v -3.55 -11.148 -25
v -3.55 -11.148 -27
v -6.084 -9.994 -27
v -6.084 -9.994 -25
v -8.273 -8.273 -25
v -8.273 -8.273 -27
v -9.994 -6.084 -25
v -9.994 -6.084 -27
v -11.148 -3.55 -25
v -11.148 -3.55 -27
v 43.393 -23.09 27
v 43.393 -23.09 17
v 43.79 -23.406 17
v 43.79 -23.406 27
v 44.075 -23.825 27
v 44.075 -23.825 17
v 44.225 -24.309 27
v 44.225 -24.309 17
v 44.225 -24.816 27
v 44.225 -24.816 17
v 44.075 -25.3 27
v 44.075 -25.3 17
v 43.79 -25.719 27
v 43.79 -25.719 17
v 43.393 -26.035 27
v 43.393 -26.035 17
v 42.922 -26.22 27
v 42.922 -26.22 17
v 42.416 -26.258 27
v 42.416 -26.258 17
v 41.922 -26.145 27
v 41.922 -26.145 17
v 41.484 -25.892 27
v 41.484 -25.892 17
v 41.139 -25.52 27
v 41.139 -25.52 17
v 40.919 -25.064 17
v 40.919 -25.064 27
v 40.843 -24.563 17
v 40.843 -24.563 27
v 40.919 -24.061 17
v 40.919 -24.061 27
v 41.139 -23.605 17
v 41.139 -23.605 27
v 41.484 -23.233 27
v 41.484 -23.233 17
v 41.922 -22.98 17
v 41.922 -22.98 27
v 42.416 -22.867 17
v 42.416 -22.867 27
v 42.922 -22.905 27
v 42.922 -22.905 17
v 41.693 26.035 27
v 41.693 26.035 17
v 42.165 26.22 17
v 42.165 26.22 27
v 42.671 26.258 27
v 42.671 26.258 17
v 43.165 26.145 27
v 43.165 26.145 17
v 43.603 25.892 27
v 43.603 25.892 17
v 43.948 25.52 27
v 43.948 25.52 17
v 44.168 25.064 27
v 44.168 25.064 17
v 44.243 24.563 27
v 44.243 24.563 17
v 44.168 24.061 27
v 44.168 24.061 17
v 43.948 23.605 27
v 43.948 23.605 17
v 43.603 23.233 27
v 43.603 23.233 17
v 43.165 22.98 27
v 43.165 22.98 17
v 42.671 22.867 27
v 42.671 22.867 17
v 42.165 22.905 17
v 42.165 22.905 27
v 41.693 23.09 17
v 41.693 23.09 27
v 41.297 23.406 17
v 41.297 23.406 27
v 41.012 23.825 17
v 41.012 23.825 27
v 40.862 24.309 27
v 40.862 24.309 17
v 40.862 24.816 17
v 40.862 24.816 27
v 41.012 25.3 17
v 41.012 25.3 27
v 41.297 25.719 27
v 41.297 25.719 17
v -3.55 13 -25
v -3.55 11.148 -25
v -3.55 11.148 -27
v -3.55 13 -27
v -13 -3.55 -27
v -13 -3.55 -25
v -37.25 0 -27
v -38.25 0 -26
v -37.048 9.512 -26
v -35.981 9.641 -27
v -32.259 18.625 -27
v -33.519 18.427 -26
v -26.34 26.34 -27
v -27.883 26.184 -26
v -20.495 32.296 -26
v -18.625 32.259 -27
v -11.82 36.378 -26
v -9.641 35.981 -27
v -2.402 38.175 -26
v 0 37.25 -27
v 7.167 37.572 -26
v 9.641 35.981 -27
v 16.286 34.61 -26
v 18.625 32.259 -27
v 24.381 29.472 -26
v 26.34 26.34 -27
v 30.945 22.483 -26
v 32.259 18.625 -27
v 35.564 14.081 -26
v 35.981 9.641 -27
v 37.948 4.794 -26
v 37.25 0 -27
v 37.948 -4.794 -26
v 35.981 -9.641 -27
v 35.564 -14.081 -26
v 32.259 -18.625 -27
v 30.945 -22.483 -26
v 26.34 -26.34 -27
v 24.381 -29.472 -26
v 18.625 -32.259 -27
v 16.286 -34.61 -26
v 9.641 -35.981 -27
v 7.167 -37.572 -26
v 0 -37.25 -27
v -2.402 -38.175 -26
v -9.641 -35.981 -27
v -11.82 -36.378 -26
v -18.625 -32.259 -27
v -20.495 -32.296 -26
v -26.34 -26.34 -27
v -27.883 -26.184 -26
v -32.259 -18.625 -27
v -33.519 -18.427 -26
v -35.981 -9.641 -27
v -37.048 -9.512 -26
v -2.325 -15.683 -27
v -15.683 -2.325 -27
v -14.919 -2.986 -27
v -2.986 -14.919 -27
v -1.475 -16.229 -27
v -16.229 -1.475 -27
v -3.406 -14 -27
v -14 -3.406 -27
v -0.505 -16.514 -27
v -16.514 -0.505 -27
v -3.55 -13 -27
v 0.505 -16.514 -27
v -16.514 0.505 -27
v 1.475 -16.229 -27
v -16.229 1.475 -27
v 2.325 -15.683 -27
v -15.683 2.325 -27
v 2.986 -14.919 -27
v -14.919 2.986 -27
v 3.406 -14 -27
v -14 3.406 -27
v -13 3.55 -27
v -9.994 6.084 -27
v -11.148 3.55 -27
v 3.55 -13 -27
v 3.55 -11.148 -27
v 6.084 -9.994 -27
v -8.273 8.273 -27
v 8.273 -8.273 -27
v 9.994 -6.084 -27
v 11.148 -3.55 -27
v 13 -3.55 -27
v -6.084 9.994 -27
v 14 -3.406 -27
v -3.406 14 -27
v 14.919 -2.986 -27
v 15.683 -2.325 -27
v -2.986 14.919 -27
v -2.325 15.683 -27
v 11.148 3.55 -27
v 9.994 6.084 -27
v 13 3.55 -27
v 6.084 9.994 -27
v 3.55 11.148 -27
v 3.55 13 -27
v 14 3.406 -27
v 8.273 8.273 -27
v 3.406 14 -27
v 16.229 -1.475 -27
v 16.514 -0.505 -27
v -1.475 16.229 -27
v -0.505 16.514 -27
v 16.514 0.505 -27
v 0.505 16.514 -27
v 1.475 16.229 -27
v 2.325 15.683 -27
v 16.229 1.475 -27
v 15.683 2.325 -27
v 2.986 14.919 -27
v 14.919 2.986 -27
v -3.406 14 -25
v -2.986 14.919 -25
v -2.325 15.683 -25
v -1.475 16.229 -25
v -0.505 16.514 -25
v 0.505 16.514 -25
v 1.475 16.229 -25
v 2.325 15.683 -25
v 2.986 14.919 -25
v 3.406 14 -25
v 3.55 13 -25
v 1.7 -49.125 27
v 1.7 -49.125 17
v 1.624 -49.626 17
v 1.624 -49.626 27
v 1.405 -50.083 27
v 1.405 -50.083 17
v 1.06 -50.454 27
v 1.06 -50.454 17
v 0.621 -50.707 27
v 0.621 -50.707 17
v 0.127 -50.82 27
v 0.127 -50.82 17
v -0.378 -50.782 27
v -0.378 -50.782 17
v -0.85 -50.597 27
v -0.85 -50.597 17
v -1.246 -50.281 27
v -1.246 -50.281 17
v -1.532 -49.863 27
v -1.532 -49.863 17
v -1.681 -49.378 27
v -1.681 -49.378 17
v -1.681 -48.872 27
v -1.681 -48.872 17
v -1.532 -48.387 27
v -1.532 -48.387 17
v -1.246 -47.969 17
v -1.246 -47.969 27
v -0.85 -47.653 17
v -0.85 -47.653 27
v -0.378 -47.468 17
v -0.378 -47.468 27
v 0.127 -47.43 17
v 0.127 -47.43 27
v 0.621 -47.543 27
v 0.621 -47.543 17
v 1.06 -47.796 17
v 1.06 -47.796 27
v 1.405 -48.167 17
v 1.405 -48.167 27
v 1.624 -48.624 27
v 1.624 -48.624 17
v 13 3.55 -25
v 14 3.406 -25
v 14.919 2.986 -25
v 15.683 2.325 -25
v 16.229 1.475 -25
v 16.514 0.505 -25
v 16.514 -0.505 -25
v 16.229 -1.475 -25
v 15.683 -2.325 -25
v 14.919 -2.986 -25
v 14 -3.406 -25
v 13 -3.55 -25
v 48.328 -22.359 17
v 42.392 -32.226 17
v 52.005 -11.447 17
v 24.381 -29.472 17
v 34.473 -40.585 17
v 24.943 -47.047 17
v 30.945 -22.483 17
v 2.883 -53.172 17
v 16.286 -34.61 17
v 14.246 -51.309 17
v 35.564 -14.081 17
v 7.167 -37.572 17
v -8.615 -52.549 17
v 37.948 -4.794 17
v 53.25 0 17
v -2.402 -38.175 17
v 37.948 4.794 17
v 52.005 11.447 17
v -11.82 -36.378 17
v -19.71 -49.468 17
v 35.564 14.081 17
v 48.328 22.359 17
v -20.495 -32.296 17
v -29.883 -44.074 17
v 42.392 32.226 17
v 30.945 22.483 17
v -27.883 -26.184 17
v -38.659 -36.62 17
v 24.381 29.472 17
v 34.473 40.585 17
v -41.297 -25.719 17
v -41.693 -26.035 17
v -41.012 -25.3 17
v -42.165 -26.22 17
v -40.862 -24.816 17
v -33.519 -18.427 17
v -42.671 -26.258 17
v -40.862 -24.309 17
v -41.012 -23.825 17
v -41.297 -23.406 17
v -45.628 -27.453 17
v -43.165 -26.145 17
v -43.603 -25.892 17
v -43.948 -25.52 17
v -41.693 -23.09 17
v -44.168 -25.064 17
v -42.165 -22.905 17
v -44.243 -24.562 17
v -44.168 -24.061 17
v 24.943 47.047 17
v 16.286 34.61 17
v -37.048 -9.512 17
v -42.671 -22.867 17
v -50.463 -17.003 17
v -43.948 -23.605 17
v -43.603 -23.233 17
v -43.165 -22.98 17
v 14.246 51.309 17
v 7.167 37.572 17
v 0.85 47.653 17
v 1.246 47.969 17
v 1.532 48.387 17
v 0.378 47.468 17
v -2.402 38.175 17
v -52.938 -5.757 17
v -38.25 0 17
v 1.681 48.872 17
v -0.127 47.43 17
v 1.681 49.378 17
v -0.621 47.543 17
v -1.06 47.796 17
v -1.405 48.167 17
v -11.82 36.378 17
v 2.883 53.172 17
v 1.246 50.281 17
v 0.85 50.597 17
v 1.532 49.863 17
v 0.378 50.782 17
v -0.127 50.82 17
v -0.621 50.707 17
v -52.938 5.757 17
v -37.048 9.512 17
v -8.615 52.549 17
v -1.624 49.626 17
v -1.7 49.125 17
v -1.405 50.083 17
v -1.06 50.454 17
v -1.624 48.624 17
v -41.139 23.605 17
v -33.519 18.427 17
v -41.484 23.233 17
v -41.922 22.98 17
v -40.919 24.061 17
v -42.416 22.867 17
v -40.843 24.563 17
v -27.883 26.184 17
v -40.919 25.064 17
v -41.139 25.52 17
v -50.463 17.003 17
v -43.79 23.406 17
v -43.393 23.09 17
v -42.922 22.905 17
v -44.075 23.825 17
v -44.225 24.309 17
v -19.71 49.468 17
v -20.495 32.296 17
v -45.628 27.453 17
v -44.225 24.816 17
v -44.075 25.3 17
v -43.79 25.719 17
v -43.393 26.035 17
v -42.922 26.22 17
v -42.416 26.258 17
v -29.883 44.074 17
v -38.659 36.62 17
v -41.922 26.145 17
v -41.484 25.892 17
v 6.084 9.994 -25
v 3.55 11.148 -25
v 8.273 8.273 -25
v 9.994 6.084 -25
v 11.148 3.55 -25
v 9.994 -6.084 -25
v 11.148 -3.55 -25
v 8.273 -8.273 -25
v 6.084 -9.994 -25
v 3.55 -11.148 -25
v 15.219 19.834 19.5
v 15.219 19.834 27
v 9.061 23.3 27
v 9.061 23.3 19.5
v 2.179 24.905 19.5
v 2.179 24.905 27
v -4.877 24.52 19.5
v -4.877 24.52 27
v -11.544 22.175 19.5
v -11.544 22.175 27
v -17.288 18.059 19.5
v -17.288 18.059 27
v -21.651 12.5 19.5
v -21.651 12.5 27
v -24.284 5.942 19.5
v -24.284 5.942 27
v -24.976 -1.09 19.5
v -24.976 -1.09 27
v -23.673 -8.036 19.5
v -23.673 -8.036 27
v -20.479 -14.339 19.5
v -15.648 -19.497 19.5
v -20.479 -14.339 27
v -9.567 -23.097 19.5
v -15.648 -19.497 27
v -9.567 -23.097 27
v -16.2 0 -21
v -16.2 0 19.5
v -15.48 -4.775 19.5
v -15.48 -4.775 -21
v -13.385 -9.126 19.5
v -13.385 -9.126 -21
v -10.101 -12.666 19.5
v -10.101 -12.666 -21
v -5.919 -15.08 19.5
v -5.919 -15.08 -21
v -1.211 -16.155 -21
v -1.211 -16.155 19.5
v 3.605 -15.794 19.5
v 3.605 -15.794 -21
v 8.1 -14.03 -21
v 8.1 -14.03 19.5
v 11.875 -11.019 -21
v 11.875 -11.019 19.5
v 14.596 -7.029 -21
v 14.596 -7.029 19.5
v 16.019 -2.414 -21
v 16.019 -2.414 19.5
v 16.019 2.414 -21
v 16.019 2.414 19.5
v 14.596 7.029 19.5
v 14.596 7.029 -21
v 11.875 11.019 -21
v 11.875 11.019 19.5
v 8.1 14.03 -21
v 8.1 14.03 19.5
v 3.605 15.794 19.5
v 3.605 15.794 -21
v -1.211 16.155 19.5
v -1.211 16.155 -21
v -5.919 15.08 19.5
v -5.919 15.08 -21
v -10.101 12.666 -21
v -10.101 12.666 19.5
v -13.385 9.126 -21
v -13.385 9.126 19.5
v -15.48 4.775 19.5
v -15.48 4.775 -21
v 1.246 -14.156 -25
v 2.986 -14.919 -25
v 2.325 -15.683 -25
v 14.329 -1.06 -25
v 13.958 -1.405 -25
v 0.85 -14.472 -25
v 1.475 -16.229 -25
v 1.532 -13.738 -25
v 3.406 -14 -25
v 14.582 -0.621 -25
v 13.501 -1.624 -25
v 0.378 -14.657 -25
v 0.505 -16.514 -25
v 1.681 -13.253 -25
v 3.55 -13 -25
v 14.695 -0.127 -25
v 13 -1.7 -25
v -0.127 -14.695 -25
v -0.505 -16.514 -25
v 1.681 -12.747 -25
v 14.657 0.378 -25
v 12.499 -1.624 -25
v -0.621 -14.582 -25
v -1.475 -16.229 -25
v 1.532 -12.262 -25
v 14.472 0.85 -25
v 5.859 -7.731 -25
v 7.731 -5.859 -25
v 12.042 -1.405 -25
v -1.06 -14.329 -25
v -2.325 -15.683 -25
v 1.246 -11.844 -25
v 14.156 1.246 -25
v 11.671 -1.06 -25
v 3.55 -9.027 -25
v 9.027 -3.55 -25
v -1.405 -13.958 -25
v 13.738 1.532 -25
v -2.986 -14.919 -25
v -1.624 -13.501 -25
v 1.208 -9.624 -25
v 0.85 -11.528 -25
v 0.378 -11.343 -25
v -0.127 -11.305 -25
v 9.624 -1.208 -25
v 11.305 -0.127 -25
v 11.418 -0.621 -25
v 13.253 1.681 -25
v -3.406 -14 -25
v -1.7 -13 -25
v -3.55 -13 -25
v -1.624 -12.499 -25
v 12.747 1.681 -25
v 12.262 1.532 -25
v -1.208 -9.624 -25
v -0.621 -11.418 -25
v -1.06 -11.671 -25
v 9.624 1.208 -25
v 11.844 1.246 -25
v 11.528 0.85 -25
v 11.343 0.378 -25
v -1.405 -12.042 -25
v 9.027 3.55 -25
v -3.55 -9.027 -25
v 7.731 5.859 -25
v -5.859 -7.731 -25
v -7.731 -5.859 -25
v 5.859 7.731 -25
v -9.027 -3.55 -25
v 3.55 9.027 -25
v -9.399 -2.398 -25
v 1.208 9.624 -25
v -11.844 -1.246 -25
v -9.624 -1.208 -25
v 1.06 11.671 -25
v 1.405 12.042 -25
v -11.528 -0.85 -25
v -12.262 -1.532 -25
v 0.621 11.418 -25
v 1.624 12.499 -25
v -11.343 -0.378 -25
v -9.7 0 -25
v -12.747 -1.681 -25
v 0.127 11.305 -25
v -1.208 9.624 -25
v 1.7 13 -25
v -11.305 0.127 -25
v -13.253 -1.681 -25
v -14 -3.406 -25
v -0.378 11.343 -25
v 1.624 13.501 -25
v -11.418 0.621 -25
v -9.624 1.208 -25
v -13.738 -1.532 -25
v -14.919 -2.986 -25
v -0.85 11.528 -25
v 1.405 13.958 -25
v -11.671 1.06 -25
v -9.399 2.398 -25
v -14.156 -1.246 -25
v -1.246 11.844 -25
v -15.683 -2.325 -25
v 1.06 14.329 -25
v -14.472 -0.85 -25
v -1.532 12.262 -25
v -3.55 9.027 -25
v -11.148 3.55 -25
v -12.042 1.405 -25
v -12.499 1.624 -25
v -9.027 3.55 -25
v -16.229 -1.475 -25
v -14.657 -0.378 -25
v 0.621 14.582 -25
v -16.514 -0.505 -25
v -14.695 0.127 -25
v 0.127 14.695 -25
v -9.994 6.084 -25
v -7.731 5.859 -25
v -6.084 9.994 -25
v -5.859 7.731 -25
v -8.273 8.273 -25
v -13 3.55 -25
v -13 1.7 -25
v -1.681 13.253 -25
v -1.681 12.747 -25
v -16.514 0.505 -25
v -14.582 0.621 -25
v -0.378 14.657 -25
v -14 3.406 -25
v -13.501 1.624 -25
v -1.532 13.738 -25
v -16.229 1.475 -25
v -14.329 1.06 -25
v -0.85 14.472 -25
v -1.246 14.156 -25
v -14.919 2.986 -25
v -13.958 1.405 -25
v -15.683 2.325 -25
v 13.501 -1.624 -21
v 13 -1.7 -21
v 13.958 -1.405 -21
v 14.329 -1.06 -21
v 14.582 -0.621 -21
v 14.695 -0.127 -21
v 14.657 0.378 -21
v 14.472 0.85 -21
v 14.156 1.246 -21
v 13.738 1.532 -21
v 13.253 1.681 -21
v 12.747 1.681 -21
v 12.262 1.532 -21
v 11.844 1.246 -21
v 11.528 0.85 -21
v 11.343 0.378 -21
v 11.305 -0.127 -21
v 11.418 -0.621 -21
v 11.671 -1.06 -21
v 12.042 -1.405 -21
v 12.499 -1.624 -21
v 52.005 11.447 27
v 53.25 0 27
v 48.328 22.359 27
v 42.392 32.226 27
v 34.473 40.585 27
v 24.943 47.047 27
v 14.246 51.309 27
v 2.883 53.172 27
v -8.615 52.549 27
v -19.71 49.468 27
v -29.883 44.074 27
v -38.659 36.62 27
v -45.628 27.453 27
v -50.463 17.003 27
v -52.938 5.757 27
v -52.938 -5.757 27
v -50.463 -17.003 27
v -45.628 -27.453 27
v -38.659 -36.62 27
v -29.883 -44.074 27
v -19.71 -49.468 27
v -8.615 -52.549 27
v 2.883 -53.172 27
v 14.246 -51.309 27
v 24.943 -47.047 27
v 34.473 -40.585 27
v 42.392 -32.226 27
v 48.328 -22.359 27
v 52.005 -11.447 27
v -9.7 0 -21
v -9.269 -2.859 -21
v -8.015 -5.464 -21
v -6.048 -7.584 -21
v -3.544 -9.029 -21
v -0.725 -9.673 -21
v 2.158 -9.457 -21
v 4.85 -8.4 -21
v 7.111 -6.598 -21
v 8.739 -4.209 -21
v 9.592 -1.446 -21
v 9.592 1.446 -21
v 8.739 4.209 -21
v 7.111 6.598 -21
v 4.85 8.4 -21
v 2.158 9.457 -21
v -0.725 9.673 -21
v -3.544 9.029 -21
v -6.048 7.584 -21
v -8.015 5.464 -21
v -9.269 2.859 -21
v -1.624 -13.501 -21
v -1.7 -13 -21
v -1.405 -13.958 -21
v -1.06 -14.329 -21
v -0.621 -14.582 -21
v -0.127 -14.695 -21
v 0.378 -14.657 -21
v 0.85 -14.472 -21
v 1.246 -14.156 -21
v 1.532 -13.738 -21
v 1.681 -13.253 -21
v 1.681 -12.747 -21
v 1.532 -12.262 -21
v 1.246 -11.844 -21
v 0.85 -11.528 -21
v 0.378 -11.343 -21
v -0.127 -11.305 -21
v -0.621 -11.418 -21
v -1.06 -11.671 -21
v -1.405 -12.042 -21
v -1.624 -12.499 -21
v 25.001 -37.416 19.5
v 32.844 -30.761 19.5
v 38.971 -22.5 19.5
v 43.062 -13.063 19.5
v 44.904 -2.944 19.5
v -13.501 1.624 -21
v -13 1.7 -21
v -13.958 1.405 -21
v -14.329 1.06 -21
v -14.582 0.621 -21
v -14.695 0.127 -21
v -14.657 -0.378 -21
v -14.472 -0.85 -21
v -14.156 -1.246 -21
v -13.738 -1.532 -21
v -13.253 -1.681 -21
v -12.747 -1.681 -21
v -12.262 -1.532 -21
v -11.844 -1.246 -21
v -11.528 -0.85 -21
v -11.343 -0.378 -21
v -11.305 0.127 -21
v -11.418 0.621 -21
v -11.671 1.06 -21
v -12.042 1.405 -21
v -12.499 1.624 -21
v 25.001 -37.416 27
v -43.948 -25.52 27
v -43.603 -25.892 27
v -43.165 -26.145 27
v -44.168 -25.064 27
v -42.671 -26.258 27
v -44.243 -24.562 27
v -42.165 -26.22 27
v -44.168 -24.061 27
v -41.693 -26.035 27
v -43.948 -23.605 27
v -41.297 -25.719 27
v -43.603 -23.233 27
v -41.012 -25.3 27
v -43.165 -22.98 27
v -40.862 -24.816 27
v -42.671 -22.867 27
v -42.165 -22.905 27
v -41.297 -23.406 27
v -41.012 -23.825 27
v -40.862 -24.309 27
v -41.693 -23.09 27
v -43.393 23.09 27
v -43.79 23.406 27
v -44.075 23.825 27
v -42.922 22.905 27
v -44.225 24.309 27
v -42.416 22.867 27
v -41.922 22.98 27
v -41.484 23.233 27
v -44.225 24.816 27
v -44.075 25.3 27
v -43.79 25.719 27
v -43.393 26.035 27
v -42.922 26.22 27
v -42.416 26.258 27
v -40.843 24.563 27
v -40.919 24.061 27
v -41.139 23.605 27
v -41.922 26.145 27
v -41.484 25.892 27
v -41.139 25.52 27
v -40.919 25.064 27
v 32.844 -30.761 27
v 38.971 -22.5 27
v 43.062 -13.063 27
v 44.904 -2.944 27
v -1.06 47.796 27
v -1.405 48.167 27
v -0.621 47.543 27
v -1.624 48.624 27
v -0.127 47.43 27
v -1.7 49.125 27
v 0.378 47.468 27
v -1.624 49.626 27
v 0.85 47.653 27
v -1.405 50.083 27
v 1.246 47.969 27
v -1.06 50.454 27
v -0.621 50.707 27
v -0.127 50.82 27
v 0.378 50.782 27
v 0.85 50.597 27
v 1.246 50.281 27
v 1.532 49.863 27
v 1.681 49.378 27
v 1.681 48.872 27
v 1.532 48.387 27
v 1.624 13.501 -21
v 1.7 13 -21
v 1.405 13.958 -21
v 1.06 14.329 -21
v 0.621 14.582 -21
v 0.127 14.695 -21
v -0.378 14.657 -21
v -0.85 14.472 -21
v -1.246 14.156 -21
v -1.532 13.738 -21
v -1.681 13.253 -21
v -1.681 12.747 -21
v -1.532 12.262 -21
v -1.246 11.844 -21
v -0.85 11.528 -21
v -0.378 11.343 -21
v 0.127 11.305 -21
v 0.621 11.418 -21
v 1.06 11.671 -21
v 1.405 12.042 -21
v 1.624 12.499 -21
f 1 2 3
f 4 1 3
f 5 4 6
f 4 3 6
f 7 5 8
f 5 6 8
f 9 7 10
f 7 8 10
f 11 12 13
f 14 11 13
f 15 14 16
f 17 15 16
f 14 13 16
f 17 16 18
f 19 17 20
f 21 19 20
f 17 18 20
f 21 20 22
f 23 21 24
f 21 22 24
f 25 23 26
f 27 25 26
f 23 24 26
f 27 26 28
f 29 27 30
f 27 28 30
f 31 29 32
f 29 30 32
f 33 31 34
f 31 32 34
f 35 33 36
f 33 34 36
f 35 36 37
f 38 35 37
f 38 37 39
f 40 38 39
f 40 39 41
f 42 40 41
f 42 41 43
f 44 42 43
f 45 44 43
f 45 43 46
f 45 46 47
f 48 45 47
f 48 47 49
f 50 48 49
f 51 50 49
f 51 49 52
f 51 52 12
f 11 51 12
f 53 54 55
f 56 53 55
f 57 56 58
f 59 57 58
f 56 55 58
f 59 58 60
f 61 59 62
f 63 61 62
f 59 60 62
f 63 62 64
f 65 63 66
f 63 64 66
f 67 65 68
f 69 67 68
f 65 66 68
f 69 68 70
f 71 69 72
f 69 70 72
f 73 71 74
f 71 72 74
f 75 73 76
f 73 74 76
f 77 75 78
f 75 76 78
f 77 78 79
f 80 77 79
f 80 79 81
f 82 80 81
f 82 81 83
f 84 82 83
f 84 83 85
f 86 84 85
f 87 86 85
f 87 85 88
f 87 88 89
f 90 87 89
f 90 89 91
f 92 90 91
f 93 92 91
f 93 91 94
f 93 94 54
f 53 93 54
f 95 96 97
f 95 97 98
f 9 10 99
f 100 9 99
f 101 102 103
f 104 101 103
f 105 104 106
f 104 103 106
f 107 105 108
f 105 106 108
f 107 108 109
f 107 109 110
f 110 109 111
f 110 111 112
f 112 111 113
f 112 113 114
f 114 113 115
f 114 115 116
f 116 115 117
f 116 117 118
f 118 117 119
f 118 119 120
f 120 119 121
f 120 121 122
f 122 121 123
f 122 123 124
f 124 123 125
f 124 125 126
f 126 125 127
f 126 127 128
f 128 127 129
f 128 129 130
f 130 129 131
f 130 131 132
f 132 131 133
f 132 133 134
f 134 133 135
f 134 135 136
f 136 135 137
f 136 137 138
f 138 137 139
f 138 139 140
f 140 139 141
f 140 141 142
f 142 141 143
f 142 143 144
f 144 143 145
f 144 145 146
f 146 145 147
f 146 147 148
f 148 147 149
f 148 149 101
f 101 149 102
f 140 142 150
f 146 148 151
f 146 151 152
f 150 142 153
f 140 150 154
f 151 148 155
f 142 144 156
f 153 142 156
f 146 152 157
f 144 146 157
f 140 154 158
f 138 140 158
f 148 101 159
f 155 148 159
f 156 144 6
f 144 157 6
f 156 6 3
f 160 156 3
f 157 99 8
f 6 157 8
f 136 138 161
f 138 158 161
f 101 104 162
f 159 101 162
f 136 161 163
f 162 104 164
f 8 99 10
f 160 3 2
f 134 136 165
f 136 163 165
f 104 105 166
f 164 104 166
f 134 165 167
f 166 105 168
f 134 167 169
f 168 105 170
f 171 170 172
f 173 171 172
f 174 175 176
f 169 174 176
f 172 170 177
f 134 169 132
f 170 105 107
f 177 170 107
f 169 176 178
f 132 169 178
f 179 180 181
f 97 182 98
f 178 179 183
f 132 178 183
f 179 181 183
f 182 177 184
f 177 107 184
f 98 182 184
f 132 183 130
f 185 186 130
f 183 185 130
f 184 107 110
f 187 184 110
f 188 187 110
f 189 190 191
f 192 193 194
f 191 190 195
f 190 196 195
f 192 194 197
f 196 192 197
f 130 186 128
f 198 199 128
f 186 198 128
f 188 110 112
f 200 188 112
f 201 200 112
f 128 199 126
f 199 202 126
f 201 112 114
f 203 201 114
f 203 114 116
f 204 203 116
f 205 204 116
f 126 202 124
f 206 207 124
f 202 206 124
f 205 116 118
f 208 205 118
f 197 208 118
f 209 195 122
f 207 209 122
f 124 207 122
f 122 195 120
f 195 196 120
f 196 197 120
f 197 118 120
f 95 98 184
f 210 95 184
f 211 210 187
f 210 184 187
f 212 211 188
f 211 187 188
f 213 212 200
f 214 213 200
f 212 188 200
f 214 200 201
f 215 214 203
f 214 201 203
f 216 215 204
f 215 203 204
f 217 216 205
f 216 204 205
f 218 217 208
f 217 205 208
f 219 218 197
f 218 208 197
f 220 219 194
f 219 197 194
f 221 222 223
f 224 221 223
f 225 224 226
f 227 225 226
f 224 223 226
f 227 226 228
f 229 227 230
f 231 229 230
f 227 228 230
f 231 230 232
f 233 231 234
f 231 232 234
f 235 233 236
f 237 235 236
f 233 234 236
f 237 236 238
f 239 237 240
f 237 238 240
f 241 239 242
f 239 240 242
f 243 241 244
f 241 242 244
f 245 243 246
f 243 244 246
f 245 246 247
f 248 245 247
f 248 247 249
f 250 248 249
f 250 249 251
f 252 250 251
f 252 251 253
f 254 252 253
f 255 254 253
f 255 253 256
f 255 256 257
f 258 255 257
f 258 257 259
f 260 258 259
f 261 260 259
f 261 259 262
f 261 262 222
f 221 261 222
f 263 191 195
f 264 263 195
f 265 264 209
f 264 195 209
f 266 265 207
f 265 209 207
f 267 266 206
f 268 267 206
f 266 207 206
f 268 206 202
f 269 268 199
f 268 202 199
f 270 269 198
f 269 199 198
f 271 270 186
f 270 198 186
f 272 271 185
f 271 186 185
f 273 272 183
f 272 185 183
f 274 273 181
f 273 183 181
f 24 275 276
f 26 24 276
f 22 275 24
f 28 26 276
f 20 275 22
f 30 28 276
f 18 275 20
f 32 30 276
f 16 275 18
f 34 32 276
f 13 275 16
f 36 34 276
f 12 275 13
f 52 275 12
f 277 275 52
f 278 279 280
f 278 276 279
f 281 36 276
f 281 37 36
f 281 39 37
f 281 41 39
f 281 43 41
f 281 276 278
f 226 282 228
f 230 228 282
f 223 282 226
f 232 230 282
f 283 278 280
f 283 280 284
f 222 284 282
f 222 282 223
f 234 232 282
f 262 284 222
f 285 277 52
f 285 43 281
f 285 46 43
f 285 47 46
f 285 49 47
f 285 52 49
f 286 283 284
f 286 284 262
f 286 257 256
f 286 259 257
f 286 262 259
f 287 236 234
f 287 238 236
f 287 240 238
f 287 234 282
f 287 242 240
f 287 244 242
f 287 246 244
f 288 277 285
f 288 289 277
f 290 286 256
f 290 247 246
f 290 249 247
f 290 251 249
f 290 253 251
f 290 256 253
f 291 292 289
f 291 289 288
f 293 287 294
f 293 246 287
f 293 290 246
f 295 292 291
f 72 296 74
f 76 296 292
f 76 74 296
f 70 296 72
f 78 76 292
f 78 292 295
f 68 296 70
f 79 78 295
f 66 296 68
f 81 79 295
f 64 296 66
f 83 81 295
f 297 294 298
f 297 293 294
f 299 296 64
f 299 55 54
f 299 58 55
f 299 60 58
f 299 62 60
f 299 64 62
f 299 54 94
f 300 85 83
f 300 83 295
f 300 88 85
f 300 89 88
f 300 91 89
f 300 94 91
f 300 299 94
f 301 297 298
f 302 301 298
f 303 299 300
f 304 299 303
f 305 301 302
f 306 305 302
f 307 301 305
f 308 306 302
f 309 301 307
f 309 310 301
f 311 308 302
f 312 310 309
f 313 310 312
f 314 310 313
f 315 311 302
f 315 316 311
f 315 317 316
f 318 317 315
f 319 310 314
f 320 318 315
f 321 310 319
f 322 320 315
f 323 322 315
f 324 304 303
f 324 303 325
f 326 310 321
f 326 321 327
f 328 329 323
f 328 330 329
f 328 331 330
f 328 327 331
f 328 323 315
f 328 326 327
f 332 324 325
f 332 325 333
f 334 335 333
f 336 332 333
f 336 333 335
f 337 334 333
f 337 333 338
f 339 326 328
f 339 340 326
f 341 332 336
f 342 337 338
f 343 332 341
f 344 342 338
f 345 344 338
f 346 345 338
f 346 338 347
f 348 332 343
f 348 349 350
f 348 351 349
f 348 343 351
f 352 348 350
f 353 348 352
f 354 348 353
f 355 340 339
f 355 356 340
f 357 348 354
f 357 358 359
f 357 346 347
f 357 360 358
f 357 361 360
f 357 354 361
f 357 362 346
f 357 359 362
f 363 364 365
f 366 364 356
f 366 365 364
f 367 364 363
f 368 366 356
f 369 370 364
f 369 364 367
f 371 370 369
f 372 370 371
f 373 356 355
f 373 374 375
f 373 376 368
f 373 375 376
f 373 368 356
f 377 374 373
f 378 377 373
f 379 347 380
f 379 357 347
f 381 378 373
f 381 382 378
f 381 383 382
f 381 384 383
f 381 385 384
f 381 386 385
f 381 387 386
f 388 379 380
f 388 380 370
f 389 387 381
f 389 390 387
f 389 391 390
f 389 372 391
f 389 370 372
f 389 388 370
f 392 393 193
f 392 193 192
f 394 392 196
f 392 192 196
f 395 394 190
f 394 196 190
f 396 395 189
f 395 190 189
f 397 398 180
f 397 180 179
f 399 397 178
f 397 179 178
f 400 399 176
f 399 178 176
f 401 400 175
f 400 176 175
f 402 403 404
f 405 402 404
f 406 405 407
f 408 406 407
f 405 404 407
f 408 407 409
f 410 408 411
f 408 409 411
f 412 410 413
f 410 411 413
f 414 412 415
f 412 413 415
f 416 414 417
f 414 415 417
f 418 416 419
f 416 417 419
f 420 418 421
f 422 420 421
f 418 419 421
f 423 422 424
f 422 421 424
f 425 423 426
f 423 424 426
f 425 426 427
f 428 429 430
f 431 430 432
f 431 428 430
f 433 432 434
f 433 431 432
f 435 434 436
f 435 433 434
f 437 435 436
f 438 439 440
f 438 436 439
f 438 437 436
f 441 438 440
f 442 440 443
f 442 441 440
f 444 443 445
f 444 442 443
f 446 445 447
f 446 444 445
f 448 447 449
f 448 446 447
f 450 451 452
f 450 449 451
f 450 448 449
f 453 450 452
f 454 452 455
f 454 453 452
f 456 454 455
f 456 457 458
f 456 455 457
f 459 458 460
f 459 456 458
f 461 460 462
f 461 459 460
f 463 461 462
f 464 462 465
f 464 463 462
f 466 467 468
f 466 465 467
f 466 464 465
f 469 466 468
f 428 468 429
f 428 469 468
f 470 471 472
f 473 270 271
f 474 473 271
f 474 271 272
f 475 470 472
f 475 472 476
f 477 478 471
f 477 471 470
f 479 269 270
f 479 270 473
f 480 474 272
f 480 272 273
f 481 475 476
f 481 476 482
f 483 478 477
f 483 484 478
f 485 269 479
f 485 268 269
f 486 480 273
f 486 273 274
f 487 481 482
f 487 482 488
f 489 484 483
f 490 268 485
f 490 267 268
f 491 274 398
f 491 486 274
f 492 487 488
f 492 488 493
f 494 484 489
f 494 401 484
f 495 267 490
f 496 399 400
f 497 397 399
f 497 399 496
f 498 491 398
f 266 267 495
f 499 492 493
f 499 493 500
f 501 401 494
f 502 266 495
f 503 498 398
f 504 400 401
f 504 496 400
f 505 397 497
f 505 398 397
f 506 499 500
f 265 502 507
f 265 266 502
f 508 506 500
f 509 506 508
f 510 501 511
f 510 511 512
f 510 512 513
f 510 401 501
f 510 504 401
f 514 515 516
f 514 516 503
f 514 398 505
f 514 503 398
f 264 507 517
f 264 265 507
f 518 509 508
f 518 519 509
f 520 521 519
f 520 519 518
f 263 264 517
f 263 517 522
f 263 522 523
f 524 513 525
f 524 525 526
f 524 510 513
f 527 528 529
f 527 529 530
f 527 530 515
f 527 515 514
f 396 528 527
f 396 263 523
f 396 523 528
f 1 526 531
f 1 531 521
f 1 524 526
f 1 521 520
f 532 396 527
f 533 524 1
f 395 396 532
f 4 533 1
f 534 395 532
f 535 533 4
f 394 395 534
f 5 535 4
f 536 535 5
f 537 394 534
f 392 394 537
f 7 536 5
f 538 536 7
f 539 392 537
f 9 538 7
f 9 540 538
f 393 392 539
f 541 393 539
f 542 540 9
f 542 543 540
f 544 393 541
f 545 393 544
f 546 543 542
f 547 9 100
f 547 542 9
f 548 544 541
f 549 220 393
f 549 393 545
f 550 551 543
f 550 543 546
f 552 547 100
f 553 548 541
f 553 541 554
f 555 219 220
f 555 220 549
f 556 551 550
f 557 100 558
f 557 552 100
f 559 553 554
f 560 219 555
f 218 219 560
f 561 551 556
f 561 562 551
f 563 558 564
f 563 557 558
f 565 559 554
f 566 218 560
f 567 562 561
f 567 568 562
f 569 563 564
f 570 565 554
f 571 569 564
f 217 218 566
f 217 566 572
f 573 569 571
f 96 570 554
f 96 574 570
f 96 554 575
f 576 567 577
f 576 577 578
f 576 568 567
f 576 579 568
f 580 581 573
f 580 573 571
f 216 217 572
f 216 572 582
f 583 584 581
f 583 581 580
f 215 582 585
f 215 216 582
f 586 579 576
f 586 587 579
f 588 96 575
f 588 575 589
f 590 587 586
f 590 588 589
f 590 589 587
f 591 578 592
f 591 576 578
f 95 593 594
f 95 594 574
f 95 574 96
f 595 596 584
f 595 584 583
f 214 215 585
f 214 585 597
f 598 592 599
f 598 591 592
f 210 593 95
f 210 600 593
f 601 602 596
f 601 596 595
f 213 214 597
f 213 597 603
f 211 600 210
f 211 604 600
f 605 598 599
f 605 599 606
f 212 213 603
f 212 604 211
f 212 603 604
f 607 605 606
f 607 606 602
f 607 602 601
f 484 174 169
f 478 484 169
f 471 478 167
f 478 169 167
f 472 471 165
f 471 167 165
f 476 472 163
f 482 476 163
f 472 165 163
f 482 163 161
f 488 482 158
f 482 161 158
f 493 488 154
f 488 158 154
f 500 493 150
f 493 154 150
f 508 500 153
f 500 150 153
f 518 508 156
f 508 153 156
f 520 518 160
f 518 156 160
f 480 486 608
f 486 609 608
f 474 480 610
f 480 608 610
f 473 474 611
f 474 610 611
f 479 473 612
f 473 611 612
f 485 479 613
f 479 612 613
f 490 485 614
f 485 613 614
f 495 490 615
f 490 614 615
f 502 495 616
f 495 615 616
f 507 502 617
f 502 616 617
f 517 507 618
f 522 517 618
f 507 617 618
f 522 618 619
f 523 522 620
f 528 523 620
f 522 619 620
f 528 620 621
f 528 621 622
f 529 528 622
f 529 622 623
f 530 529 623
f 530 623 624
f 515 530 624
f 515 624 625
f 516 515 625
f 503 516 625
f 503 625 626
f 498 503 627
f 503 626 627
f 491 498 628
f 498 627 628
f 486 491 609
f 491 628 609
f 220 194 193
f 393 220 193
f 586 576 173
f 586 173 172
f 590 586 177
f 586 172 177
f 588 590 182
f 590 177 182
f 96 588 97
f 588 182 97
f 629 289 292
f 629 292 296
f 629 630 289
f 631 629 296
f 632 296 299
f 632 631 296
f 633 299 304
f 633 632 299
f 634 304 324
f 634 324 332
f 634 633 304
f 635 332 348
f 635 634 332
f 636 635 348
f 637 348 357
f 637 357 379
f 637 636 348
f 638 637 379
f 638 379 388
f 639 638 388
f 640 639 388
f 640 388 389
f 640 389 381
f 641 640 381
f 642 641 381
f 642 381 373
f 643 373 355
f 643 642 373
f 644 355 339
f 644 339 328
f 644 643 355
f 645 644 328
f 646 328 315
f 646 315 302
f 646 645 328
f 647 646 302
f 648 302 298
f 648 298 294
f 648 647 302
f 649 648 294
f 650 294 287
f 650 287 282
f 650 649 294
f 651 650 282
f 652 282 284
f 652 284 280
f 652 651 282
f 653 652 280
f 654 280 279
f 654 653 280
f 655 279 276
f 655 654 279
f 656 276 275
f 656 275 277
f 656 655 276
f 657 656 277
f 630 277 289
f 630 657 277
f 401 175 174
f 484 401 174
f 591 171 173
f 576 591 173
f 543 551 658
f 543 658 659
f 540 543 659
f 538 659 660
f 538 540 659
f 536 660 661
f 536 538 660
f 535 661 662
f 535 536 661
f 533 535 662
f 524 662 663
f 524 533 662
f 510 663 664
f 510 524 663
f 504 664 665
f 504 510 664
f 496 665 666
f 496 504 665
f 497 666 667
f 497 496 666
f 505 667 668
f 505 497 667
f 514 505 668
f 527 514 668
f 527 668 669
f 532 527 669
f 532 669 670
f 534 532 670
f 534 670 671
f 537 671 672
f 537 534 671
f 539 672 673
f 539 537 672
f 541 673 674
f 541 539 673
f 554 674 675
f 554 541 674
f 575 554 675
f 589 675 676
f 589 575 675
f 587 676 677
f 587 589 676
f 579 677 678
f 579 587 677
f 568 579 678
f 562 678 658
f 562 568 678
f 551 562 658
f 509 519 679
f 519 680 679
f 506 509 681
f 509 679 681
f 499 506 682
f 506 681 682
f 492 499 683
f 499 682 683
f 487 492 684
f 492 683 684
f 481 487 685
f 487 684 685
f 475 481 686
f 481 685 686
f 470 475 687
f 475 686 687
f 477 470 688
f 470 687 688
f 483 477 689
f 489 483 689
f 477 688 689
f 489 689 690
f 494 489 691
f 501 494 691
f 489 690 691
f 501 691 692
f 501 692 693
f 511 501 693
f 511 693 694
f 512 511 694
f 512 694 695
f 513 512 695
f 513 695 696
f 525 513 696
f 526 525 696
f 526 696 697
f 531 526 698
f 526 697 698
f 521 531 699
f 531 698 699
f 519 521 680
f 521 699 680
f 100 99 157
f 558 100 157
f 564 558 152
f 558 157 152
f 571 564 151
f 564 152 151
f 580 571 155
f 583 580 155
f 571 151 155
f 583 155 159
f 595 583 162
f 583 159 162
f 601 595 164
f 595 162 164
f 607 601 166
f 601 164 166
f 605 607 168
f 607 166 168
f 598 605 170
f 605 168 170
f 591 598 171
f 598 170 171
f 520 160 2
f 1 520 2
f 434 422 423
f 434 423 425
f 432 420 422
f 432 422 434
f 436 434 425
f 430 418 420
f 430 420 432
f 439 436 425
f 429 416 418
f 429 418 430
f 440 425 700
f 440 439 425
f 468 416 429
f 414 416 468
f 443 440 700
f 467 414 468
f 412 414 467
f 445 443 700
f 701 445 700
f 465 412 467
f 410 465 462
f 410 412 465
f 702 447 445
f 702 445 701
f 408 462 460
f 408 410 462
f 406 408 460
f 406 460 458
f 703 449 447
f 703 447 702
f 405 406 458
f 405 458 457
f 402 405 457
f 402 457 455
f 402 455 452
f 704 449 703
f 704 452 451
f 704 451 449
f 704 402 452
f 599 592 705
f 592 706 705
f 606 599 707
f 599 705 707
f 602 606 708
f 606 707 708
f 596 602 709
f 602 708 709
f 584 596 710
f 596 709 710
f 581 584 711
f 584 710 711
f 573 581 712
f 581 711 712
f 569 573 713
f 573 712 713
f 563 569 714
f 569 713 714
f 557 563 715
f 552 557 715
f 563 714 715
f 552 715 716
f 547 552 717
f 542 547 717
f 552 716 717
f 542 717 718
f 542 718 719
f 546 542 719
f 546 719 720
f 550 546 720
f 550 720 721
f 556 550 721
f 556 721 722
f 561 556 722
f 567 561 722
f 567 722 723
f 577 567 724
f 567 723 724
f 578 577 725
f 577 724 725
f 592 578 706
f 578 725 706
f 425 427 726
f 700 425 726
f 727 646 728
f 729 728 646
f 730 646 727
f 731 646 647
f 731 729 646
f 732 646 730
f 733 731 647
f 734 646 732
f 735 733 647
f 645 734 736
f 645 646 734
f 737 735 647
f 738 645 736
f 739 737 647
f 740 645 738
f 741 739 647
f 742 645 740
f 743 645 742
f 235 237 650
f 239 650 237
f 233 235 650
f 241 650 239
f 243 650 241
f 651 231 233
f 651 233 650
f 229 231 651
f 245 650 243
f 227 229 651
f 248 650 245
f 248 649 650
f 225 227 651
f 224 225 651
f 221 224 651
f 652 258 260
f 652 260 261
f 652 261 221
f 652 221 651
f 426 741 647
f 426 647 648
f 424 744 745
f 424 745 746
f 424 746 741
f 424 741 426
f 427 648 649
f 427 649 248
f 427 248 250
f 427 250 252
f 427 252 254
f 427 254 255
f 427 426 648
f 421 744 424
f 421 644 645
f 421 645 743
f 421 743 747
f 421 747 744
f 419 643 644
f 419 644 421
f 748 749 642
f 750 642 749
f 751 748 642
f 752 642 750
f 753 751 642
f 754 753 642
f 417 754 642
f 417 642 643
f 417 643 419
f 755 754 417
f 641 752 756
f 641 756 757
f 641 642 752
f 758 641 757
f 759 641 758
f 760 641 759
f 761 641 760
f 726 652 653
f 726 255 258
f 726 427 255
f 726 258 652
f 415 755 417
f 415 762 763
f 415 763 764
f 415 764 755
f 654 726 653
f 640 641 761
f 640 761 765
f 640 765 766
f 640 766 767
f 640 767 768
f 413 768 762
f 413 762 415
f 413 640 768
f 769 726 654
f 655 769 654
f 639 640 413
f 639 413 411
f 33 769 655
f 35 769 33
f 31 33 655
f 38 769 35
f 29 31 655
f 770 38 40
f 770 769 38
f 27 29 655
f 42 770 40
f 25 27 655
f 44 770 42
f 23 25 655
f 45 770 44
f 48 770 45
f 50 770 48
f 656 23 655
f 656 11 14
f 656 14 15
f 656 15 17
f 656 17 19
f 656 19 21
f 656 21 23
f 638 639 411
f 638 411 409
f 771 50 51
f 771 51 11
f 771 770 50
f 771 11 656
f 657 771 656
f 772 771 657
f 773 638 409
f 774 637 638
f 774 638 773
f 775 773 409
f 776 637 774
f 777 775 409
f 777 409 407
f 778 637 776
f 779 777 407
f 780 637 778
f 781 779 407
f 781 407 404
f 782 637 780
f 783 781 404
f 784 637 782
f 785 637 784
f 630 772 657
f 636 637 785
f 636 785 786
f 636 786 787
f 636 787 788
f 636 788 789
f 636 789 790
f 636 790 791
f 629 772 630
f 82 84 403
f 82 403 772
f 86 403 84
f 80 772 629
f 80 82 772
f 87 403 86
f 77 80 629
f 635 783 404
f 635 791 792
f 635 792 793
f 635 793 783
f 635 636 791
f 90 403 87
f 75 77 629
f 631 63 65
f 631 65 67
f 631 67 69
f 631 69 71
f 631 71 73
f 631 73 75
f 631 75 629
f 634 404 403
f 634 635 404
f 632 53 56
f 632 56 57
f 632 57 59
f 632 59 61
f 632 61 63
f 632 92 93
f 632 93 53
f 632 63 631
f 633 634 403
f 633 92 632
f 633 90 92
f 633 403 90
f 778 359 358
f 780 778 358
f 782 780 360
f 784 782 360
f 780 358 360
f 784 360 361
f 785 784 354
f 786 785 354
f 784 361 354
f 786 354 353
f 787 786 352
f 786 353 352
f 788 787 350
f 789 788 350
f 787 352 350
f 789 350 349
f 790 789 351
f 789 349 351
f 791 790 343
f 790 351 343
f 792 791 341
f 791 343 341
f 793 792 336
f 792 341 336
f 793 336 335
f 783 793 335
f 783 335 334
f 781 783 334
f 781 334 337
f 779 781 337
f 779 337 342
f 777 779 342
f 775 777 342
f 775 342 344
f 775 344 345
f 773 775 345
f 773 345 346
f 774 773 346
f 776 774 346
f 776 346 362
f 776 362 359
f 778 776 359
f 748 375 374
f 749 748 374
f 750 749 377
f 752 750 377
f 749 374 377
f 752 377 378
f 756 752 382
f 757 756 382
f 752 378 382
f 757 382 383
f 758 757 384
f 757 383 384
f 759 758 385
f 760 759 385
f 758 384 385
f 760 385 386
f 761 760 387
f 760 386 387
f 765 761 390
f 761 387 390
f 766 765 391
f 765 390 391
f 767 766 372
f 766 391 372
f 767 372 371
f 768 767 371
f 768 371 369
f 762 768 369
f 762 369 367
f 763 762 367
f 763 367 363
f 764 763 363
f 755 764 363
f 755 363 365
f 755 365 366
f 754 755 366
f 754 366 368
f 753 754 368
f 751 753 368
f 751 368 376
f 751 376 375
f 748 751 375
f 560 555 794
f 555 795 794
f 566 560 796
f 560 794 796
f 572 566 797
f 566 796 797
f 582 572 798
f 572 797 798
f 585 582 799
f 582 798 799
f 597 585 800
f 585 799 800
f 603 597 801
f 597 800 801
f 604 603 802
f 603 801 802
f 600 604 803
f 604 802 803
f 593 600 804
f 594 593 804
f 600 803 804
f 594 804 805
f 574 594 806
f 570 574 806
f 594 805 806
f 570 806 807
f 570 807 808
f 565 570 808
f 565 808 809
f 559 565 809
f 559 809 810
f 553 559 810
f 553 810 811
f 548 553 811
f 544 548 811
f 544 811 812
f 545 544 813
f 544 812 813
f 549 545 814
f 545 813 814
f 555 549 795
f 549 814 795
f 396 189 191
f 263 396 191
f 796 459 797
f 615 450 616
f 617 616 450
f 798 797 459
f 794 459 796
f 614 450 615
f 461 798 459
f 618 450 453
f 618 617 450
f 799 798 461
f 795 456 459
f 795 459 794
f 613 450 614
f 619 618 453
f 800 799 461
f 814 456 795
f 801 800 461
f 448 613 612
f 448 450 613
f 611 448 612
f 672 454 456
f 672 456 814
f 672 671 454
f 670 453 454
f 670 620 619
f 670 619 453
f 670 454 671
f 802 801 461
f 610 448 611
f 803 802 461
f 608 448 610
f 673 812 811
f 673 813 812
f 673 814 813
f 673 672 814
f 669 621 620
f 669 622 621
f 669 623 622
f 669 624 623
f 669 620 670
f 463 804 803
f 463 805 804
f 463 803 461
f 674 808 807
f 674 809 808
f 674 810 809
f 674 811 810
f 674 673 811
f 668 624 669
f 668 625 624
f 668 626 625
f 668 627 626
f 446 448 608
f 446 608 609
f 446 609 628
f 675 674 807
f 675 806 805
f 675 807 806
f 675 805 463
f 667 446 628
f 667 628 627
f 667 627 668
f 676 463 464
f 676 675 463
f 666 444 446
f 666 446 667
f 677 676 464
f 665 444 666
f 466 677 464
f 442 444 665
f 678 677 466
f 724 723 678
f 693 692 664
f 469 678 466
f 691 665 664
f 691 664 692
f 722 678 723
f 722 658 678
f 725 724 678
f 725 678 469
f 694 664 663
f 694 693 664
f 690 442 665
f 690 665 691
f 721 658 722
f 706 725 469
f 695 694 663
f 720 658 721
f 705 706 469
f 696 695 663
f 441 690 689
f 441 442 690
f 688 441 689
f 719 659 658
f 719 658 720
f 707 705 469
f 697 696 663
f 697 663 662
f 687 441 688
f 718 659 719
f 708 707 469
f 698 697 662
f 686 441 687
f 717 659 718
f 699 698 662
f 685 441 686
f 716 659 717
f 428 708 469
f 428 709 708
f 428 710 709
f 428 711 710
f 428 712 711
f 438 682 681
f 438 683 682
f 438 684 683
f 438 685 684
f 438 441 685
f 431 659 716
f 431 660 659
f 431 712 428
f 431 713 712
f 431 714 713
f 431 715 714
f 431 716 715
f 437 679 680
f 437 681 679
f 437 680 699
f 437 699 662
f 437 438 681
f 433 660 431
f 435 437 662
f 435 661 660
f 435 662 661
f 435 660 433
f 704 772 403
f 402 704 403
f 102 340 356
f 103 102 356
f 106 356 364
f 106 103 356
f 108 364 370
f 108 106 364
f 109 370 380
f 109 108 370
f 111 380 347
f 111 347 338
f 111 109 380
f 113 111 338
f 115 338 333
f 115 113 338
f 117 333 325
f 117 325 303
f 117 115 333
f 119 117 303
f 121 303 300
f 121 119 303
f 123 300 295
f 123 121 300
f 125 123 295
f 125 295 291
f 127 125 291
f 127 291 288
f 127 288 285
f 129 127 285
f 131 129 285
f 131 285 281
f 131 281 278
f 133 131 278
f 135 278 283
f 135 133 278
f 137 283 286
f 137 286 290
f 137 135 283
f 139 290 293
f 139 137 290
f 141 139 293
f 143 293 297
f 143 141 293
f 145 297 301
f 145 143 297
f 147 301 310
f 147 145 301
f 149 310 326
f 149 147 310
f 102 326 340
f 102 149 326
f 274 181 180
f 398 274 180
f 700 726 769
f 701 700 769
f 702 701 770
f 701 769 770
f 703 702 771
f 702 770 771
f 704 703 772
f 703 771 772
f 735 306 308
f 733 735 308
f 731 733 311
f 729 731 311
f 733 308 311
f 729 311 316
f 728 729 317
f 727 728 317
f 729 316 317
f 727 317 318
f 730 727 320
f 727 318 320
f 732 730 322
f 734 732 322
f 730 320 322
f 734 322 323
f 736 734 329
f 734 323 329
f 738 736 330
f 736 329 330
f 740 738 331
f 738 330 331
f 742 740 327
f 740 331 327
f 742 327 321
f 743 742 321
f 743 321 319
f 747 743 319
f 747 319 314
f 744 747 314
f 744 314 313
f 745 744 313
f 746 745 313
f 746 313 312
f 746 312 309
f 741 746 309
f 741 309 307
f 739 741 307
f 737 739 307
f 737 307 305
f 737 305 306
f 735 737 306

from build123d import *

# Parameters (mm, degrees)
SKETCH1_R            = 53.25
BOSS_EXTRUDE1_DEPTH  = 27
SKETCH2_OUTSIDE_W    = 140.5
SKETCH2_OUTSIDE_H    = 140.5
SKETCH2_OUTSIDE_R    = 38.25
CUT_EXTRUDE1_DEPTH   = 44
M3_CLEARANCE_HOLE2_D = 3.4
CIRPATTERN1_COUNT    = 6
CUT_EXTRUDE3_DEPTH   = 7.5
M3_CLEARANCE_HOLE1_D = 3.4
CUT_EXTRUDE4_DEPTH   = 2
CIRPATTERN2_COUNT    = 4
SKETCH14_R           = 11.7
CUT_EXTRUDE5_DEPTH   = 2
CHAMFER1_SIZE        = 1


with BuildPart() as part:
    # Sketch1 → Boss-Extrude1 (new, symmetric)
    with BuildSketch(Plane.XY):
        Circle(SKETCH1_R)
    extrude(amount=BOSS_EXTRUDE1_DEPTH, both=True)

    # Sketch2 outside → Cut-Extrude1 (cut)
    with BuildSketch(Plane(origin=(0, 0, -27), x_dir=(-1, 0, 0), z_dir=(0, 0, -1))):
        Rectangle(SKETCH2_OUTSIDE_W, SKETCH2_OUTSIDE_H)
        Circle(SKETCH2_OUTSIDE_R, mode=Mode.SUBTRACT)
    extrude(amount=-CUT_EXTRUDE1_DEPTH, mode=Mode.SUBTRACT)

    # M3 Clearance Hole2 (through all)
    with Locations(Plane.XY.offset(27)):
        with Locations((0, 49.125)):
            m3_clearance_hole2 = Hole(M3_CLEARANCE_HOLE2_D / 2)

    # CirPattern1: M3 Clearance Hole2 ×6 about axis
    cirpattern1_axis = Axis((0, 0, 0), (0, 0, 1))
    for i in range(1, CIRPATTERN1_COUNT):
        add(m3_clearance_hole2.rotate(cirpattern1_axis, i * 360 / CIRPATTERN1_COUNT), mode=Mode.SUBTRACT)

    # Sketch6 → Cut-Revolve1 (revolve, cut)
    with BuildSketch(Plane(origin=(0, 0, 0), x_dir=(0, 0, -1), z_dir=(1, 0, 0)), mode=Mode.PRIVATE) as cut_revolve1_sk:
        Polygon((27, 0), (-27, 0), (-27, 16.2), (21, 16.2), (21, 9.7), (27, 9.7), align=None)
    revolve(cut_revolve1_sk.sketch.rotate(Axis((0, 0, -27), (0, 0, 1)), 90), axis=Axis((0, 0, -27), (0, 0, 1)), mode=Mode.SUBTRACT)

    # Sketch11 → Cut-Extrude3 (cut)
    with BuildSketch(Plane.XY.offset(27)):
        with BuildLine():
            Line((-9.567085809, -23.096988313), (25.001320964, -37.415691228))
            ThreePointArc((25.001320964, -37.415691228), (38.97114317, -22.5), (44.903599585, -2.943933469))
            Line((44.903599585, -2.943933469), (15.219035725, 19.833833507))
            ThreePointArc((15.219035725, 19.833833507), (-21.650635095, 12.5), (-9.567085809, -23.096988313))
        make_face()
    extrude(amount=-CUT_EXTRUDE3_DEPTH, mode=Mode.SUBTRACT)

    # M3 Clearance Hole1 (through all)
    with Locations(Plane(origin=(0, 0, -27), x_dir=(-1, 0, 0), z_dir=(0, 0, -1))):
        with Locations((0, 13)):
            m3_clearance_hole1 = Hole(M3_CLEARANCE_HOLE1_D / 2)

    # Sketch13 → Cut-Extrude4 (cut)
    with BuildSketch(Plane(origin=(0, 0, -27), x_dir=(-1, 0, 0), z_dir=(0, 0, -1))):
        with BuildLine():
            Line((-3.55, 13), (-3.55, 9.027042705))
            ThreePointArc((-3.55, 9.027042705), (0, 9.7), (3.55, 9.027042705))
            Line((3.55, 9.027042705), (3.55, 13))
            ThreePointArc((3.55, 13), (0, 16.55), (-3.55, 13))
        make_face()
    cut_extrude4 = extrude(amount=-CUT_EXTRUDE4_DEPTH, mode=Mode.SUBTRACT)

    # CirPattern2: M3 Clearance Hole1, Cut-Extrude4 ×4 about axis
    cirpattern2_axis = Axis((0, 0, 0), (0, 0, 1))
    add([m3_clearance_hole1.rotate(cirpattern2_axis, i * 360 / CIRPATTERN2_COUNT) for i in range(1, CIRPATTERN2_COUNT)], mode=Mode.SUBTRACT)
    add([cut_extrude4.rotate(cirpattern2_axis, i * 360 / CIRPATTERN2_COUNT) for i in range(1, CIRPATTERN2_COUNT)], mode=Mode.SUBTRACT)

    # Sketch14 → Cut-Extrude5 (cut)
    with BuildSketch(Plane(origin=(0, 0, -27), x_dir=(-1, 0, 0), z_dir=(0, 0, -1))):
        Circle(SKETCH14_R)
    extrude(amount=-CUT_EXTRUDE5_DEPTH, mode=Mode.SUBTRACT)

    # Chamfer1
    chamfer1_edges = [part.edges().sort_by_distance(p)[0] for p in [
        (38.25, 0, -27),
    ]]
    chamfer(chamfer1_edges, length=CHAMFER1_SIZE)


solid = part.part
